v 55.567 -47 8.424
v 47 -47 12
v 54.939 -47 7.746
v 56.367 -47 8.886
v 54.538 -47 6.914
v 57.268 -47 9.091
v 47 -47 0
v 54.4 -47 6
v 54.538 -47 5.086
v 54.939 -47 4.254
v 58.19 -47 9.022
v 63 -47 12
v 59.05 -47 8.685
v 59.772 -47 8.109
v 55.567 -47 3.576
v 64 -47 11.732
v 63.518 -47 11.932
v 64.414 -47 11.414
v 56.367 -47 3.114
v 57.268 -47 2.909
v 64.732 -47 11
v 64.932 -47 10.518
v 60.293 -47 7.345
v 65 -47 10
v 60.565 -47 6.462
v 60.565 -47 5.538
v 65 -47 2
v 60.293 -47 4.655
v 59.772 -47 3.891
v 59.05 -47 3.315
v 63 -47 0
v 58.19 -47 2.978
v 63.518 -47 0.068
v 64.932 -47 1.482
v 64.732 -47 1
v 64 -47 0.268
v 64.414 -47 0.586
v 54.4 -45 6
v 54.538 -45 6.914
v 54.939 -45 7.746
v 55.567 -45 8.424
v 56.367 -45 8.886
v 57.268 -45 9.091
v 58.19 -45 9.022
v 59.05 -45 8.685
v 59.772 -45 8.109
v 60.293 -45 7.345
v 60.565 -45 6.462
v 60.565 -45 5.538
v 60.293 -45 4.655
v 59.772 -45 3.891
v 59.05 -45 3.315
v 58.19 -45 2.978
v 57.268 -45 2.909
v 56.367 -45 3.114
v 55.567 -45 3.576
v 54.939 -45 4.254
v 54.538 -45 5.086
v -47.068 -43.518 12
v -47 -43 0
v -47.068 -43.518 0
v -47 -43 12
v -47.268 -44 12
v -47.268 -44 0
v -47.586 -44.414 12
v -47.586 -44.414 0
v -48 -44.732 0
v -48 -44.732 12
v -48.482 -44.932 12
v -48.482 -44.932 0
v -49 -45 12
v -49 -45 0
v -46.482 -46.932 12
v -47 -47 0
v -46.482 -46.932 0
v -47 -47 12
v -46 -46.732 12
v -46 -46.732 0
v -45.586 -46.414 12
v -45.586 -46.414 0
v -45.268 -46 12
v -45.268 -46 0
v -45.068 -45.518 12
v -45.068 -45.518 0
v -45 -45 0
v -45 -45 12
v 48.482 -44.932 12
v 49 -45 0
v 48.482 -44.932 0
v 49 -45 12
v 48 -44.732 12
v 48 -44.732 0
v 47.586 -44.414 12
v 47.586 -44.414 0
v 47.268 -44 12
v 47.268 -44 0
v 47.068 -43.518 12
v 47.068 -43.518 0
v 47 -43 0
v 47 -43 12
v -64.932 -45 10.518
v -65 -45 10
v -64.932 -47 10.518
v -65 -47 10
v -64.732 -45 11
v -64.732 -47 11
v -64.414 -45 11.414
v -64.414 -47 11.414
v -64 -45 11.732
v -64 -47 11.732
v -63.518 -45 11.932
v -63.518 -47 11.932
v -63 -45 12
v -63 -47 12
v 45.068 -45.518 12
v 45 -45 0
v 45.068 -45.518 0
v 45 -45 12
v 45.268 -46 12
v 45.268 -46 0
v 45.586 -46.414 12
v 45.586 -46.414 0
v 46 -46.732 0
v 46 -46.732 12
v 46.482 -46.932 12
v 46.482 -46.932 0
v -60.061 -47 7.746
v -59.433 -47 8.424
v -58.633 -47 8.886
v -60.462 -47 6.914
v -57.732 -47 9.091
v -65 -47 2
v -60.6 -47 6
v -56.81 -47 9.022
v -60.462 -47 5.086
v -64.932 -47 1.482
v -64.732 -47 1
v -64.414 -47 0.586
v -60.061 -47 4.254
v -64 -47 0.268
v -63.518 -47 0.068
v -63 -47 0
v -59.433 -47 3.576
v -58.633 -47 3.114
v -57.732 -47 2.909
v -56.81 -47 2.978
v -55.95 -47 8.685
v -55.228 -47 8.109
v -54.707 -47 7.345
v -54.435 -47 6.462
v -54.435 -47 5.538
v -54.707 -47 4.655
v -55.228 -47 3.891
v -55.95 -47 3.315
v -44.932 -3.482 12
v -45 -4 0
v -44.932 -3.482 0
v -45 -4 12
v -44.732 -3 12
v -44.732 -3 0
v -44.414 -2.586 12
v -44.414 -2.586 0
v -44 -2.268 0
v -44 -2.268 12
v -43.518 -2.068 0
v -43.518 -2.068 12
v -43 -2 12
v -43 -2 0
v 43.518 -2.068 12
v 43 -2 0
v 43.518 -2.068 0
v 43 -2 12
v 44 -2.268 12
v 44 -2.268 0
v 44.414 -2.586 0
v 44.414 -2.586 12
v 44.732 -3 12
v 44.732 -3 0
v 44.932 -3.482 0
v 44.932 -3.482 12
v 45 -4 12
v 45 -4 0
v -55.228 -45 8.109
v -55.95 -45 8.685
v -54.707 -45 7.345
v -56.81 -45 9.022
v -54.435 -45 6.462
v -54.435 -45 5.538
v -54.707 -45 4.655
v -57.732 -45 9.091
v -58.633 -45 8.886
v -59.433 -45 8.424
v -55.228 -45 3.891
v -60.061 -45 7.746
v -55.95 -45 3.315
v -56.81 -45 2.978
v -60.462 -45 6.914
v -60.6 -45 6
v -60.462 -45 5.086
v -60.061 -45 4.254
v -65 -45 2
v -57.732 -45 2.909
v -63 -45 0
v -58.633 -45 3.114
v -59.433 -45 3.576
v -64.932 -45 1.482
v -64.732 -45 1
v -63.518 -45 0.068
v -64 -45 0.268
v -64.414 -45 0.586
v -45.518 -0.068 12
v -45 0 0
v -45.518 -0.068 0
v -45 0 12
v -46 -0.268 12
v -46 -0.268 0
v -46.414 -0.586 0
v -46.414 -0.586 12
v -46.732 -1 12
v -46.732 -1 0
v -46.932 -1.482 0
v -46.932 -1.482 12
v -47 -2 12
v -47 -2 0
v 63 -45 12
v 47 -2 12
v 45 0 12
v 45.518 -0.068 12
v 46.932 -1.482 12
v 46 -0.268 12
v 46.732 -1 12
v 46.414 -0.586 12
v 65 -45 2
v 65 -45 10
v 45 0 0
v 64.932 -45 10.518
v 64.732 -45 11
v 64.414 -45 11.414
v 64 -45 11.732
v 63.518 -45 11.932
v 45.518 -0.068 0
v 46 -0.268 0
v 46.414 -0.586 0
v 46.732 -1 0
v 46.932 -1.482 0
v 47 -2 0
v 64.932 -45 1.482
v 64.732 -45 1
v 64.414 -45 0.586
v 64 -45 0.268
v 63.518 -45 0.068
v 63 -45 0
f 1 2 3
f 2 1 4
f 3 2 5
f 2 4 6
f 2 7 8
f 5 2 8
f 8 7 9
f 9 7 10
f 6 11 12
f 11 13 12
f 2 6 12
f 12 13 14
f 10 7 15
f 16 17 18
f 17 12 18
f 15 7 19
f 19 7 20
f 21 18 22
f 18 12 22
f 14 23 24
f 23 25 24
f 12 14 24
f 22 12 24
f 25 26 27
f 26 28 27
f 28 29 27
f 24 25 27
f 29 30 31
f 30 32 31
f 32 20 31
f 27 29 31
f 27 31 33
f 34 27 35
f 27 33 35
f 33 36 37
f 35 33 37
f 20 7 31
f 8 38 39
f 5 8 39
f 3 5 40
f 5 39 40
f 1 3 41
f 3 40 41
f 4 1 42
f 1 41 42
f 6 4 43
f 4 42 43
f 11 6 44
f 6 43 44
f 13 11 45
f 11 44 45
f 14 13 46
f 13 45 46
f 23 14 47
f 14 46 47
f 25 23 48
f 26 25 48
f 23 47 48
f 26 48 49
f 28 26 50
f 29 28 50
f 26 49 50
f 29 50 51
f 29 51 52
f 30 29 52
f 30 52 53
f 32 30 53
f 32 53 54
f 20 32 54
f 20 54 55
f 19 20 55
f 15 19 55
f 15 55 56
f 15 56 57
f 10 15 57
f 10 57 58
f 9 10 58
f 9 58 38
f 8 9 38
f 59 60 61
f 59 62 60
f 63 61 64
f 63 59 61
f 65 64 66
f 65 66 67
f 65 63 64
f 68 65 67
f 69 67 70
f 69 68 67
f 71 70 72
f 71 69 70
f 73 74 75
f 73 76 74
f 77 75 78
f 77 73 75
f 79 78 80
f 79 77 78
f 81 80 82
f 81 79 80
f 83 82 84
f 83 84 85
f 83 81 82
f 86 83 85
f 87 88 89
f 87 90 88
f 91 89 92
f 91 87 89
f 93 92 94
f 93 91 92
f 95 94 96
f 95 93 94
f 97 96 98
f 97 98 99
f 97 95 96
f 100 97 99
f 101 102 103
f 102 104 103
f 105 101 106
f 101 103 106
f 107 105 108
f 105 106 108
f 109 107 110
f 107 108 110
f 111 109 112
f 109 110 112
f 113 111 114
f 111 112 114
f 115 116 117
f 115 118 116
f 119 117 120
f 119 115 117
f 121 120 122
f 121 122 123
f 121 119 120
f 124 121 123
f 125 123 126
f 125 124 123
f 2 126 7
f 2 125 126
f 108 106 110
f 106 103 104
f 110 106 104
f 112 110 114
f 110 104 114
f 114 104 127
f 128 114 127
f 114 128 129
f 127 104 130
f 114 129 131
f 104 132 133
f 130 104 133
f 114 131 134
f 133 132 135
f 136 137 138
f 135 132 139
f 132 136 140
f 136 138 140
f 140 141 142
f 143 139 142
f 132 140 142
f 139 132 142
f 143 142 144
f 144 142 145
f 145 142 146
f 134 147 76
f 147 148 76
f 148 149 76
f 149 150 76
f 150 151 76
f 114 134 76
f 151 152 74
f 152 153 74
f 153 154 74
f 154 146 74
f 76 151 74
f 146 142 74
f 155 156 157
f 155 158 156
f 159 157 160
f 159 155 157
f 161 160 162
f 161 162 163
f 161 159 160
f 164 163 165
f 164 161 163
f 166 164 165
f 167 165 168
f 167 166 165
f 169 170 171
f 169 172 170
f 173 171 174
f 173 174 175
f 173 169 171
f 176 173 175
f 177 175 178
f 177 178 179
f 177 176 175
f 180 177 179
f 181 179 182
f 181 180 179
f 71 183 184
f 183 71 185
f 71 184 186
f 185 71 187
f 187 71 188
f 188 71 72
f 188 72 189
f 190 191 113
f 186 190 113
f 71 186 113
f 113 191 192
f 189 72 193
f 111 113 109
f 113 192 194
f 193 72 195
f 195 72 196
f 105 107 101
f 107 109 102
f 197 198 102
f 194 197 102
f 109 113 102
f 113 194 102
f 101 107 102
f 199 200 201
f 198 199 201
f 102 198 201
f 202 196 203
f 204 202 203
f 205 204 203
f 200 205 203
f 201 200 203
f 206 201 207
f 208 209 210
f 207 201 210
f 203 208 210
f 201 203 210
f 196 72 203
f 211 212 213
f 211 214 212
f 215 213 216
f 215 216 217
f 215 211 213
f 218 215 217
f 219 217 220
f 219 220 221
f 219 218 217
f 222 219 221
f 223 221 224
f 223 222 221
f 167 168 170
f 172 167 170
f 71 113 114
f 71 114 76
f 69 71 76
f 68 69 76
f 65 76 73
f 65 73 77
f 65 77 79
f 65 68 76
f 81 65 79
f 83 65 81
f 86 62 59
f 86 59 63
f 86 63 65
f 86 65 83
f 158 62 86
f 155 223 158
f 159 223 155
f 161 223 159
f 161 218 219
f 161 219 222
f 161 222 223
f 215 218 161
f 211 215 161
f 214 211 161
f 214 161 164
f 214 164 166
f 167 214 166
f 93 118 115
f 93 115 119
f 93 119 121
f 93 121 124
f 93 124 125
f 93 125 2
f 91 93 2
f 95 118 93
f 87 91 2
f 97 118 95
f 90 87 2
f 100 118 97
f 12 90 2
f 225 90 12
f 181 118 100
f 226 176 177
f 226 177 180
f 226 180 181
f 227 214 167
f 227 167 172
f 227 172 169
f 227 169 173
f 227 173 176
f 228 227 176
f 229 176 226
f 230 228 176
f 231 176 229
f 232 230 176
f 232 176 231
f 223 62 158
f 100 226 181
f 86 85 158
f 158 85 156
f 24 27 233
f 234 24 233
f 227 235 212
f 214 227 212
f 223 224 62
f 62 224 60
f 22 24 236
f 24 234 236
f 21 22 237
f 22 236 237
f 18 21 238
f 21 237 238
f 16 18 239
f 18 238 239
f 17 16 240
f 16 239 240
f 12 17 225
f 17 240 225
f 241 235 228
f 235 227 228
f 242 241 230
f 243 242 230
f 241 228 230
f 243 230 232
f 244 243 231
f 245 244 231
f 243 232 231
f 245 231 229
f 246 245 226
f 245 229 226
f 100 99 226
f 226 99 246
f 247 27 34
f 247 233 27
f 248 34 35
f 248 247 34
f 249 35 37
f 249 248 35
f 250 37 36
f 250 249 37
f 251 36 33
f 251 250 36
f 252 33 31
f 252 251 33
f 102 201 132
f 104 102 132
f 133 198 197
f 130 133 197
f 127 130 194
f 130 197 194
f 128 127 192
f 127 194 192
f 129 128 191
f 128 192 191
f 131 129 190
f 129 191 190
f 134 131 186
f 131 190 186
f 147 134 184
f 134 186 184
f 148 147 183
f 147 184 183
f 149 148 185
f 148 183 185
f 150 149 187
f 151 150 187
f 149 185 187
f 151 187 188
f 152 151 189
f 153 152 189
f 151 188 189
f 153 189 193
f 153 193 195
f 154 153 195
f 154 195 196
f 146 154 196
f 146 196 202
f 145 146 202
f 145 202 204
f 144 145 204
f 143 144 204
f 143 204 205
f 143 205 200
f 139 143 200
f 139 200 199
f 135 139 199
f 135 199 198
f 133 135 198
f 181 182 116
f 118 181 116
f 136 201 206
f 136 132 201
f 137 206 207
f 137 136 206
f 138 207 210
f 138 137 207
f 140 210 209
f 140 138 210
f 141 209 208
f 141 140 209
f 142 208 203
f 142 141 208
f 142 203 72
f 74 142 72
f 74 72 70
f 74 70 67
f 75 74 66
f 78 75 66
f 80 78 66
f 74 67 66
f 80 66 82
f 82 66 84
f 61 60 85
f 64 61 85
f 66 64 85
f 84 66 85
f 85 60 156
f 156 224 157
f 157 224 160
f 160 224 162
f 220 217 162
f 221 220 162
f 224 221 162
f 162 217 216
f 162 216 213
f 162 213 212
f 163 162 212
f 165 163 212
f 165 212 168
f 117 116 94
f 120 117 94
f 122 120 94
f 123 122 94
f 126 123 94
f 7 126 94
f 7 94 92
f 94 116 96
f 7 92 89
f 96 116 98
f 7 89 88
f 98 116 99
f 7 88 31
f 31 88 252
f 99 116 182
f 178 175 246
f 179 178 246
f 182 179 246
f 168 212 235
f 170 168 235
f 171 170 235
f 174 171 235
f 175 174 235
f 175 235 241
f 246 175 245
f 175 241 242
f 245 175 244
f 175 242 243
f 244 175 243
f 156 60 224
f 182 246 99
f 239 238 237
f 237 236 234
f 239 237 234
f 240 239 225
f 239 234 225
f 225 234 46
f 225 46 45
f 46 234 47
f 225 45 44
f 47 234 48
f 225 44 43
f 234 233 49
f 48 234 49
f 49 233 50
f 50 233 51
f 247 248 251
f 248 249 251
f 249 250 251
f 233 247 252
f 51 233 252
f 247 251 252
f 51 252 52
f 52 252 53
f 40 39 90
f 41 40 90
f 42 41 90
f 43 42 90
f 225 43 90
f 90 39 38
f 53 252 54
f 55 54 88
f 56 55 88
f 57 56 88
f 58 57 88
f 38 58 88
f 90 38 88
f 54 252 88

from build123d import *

# Parameters (mm, degrees)
EXTRUDE_1_DEPTH     = 12
FILLET_1_R          = 2
SKETCH_2_R          = 3.1
CUT_EXTRUDE_1_DEPTH = 12


with BuildPart() as part:
    # ｽｹｯﾁ1 → ﾎﾞｽ - 押し出し1 (new body)
    with BuildSketch(Plane.XY):
        Polygon((47, 0), (-47, 0), (-47, -45), (-65, -45), (-65, -47), (-45, -47), (-45, -2), (45, -2), (45, -47), (65, -47), (65, -45), (47, -45), align=None)
    extrude(amount=EXTRUDE_1_DEPTH)

    # ﾌｨﾚｯﾄ1
    fillet_1_edges = [part.edges().sort_by_distance(p)[0] for p in [
        (65, -46, 0),
        (-65, -46, 0),
        (-65, -46, 12),
        (45, -47, 6),
        (45, -2, 6),
        (-45, -2, 6),
        (-45, -47, 6),
        (-47, -45, 6),
        (-47, 0, 6),
        (47, 0, 6),
        (47, -45, 6),
        (65, -46, 12),
    ]]
    fillet(fillet_1_edges, radius=FILLET_1_R)

    # ｽｹｯﾁ2 → ｶｯﾄ - 押し出し1 (cut)
    with BuildSketch(Plane(origin=(0, -45, 0), x_dir=(1, 0, 0), z_dir=(0, 1, 0))):
        with Locations(Location((-57.5, -6, 0), (0, 0, 180))):
            Circle(SKETCH_2_R)
        with Locations(Location((57.5, -6, 0), (0, 0, 180))):
            Circle(SKETCH_2_R)
    extrude(amount=-CUT_EXTRUDE_1_DEPTH, mode=Mode.SUBTRACT)


solid = part.part
